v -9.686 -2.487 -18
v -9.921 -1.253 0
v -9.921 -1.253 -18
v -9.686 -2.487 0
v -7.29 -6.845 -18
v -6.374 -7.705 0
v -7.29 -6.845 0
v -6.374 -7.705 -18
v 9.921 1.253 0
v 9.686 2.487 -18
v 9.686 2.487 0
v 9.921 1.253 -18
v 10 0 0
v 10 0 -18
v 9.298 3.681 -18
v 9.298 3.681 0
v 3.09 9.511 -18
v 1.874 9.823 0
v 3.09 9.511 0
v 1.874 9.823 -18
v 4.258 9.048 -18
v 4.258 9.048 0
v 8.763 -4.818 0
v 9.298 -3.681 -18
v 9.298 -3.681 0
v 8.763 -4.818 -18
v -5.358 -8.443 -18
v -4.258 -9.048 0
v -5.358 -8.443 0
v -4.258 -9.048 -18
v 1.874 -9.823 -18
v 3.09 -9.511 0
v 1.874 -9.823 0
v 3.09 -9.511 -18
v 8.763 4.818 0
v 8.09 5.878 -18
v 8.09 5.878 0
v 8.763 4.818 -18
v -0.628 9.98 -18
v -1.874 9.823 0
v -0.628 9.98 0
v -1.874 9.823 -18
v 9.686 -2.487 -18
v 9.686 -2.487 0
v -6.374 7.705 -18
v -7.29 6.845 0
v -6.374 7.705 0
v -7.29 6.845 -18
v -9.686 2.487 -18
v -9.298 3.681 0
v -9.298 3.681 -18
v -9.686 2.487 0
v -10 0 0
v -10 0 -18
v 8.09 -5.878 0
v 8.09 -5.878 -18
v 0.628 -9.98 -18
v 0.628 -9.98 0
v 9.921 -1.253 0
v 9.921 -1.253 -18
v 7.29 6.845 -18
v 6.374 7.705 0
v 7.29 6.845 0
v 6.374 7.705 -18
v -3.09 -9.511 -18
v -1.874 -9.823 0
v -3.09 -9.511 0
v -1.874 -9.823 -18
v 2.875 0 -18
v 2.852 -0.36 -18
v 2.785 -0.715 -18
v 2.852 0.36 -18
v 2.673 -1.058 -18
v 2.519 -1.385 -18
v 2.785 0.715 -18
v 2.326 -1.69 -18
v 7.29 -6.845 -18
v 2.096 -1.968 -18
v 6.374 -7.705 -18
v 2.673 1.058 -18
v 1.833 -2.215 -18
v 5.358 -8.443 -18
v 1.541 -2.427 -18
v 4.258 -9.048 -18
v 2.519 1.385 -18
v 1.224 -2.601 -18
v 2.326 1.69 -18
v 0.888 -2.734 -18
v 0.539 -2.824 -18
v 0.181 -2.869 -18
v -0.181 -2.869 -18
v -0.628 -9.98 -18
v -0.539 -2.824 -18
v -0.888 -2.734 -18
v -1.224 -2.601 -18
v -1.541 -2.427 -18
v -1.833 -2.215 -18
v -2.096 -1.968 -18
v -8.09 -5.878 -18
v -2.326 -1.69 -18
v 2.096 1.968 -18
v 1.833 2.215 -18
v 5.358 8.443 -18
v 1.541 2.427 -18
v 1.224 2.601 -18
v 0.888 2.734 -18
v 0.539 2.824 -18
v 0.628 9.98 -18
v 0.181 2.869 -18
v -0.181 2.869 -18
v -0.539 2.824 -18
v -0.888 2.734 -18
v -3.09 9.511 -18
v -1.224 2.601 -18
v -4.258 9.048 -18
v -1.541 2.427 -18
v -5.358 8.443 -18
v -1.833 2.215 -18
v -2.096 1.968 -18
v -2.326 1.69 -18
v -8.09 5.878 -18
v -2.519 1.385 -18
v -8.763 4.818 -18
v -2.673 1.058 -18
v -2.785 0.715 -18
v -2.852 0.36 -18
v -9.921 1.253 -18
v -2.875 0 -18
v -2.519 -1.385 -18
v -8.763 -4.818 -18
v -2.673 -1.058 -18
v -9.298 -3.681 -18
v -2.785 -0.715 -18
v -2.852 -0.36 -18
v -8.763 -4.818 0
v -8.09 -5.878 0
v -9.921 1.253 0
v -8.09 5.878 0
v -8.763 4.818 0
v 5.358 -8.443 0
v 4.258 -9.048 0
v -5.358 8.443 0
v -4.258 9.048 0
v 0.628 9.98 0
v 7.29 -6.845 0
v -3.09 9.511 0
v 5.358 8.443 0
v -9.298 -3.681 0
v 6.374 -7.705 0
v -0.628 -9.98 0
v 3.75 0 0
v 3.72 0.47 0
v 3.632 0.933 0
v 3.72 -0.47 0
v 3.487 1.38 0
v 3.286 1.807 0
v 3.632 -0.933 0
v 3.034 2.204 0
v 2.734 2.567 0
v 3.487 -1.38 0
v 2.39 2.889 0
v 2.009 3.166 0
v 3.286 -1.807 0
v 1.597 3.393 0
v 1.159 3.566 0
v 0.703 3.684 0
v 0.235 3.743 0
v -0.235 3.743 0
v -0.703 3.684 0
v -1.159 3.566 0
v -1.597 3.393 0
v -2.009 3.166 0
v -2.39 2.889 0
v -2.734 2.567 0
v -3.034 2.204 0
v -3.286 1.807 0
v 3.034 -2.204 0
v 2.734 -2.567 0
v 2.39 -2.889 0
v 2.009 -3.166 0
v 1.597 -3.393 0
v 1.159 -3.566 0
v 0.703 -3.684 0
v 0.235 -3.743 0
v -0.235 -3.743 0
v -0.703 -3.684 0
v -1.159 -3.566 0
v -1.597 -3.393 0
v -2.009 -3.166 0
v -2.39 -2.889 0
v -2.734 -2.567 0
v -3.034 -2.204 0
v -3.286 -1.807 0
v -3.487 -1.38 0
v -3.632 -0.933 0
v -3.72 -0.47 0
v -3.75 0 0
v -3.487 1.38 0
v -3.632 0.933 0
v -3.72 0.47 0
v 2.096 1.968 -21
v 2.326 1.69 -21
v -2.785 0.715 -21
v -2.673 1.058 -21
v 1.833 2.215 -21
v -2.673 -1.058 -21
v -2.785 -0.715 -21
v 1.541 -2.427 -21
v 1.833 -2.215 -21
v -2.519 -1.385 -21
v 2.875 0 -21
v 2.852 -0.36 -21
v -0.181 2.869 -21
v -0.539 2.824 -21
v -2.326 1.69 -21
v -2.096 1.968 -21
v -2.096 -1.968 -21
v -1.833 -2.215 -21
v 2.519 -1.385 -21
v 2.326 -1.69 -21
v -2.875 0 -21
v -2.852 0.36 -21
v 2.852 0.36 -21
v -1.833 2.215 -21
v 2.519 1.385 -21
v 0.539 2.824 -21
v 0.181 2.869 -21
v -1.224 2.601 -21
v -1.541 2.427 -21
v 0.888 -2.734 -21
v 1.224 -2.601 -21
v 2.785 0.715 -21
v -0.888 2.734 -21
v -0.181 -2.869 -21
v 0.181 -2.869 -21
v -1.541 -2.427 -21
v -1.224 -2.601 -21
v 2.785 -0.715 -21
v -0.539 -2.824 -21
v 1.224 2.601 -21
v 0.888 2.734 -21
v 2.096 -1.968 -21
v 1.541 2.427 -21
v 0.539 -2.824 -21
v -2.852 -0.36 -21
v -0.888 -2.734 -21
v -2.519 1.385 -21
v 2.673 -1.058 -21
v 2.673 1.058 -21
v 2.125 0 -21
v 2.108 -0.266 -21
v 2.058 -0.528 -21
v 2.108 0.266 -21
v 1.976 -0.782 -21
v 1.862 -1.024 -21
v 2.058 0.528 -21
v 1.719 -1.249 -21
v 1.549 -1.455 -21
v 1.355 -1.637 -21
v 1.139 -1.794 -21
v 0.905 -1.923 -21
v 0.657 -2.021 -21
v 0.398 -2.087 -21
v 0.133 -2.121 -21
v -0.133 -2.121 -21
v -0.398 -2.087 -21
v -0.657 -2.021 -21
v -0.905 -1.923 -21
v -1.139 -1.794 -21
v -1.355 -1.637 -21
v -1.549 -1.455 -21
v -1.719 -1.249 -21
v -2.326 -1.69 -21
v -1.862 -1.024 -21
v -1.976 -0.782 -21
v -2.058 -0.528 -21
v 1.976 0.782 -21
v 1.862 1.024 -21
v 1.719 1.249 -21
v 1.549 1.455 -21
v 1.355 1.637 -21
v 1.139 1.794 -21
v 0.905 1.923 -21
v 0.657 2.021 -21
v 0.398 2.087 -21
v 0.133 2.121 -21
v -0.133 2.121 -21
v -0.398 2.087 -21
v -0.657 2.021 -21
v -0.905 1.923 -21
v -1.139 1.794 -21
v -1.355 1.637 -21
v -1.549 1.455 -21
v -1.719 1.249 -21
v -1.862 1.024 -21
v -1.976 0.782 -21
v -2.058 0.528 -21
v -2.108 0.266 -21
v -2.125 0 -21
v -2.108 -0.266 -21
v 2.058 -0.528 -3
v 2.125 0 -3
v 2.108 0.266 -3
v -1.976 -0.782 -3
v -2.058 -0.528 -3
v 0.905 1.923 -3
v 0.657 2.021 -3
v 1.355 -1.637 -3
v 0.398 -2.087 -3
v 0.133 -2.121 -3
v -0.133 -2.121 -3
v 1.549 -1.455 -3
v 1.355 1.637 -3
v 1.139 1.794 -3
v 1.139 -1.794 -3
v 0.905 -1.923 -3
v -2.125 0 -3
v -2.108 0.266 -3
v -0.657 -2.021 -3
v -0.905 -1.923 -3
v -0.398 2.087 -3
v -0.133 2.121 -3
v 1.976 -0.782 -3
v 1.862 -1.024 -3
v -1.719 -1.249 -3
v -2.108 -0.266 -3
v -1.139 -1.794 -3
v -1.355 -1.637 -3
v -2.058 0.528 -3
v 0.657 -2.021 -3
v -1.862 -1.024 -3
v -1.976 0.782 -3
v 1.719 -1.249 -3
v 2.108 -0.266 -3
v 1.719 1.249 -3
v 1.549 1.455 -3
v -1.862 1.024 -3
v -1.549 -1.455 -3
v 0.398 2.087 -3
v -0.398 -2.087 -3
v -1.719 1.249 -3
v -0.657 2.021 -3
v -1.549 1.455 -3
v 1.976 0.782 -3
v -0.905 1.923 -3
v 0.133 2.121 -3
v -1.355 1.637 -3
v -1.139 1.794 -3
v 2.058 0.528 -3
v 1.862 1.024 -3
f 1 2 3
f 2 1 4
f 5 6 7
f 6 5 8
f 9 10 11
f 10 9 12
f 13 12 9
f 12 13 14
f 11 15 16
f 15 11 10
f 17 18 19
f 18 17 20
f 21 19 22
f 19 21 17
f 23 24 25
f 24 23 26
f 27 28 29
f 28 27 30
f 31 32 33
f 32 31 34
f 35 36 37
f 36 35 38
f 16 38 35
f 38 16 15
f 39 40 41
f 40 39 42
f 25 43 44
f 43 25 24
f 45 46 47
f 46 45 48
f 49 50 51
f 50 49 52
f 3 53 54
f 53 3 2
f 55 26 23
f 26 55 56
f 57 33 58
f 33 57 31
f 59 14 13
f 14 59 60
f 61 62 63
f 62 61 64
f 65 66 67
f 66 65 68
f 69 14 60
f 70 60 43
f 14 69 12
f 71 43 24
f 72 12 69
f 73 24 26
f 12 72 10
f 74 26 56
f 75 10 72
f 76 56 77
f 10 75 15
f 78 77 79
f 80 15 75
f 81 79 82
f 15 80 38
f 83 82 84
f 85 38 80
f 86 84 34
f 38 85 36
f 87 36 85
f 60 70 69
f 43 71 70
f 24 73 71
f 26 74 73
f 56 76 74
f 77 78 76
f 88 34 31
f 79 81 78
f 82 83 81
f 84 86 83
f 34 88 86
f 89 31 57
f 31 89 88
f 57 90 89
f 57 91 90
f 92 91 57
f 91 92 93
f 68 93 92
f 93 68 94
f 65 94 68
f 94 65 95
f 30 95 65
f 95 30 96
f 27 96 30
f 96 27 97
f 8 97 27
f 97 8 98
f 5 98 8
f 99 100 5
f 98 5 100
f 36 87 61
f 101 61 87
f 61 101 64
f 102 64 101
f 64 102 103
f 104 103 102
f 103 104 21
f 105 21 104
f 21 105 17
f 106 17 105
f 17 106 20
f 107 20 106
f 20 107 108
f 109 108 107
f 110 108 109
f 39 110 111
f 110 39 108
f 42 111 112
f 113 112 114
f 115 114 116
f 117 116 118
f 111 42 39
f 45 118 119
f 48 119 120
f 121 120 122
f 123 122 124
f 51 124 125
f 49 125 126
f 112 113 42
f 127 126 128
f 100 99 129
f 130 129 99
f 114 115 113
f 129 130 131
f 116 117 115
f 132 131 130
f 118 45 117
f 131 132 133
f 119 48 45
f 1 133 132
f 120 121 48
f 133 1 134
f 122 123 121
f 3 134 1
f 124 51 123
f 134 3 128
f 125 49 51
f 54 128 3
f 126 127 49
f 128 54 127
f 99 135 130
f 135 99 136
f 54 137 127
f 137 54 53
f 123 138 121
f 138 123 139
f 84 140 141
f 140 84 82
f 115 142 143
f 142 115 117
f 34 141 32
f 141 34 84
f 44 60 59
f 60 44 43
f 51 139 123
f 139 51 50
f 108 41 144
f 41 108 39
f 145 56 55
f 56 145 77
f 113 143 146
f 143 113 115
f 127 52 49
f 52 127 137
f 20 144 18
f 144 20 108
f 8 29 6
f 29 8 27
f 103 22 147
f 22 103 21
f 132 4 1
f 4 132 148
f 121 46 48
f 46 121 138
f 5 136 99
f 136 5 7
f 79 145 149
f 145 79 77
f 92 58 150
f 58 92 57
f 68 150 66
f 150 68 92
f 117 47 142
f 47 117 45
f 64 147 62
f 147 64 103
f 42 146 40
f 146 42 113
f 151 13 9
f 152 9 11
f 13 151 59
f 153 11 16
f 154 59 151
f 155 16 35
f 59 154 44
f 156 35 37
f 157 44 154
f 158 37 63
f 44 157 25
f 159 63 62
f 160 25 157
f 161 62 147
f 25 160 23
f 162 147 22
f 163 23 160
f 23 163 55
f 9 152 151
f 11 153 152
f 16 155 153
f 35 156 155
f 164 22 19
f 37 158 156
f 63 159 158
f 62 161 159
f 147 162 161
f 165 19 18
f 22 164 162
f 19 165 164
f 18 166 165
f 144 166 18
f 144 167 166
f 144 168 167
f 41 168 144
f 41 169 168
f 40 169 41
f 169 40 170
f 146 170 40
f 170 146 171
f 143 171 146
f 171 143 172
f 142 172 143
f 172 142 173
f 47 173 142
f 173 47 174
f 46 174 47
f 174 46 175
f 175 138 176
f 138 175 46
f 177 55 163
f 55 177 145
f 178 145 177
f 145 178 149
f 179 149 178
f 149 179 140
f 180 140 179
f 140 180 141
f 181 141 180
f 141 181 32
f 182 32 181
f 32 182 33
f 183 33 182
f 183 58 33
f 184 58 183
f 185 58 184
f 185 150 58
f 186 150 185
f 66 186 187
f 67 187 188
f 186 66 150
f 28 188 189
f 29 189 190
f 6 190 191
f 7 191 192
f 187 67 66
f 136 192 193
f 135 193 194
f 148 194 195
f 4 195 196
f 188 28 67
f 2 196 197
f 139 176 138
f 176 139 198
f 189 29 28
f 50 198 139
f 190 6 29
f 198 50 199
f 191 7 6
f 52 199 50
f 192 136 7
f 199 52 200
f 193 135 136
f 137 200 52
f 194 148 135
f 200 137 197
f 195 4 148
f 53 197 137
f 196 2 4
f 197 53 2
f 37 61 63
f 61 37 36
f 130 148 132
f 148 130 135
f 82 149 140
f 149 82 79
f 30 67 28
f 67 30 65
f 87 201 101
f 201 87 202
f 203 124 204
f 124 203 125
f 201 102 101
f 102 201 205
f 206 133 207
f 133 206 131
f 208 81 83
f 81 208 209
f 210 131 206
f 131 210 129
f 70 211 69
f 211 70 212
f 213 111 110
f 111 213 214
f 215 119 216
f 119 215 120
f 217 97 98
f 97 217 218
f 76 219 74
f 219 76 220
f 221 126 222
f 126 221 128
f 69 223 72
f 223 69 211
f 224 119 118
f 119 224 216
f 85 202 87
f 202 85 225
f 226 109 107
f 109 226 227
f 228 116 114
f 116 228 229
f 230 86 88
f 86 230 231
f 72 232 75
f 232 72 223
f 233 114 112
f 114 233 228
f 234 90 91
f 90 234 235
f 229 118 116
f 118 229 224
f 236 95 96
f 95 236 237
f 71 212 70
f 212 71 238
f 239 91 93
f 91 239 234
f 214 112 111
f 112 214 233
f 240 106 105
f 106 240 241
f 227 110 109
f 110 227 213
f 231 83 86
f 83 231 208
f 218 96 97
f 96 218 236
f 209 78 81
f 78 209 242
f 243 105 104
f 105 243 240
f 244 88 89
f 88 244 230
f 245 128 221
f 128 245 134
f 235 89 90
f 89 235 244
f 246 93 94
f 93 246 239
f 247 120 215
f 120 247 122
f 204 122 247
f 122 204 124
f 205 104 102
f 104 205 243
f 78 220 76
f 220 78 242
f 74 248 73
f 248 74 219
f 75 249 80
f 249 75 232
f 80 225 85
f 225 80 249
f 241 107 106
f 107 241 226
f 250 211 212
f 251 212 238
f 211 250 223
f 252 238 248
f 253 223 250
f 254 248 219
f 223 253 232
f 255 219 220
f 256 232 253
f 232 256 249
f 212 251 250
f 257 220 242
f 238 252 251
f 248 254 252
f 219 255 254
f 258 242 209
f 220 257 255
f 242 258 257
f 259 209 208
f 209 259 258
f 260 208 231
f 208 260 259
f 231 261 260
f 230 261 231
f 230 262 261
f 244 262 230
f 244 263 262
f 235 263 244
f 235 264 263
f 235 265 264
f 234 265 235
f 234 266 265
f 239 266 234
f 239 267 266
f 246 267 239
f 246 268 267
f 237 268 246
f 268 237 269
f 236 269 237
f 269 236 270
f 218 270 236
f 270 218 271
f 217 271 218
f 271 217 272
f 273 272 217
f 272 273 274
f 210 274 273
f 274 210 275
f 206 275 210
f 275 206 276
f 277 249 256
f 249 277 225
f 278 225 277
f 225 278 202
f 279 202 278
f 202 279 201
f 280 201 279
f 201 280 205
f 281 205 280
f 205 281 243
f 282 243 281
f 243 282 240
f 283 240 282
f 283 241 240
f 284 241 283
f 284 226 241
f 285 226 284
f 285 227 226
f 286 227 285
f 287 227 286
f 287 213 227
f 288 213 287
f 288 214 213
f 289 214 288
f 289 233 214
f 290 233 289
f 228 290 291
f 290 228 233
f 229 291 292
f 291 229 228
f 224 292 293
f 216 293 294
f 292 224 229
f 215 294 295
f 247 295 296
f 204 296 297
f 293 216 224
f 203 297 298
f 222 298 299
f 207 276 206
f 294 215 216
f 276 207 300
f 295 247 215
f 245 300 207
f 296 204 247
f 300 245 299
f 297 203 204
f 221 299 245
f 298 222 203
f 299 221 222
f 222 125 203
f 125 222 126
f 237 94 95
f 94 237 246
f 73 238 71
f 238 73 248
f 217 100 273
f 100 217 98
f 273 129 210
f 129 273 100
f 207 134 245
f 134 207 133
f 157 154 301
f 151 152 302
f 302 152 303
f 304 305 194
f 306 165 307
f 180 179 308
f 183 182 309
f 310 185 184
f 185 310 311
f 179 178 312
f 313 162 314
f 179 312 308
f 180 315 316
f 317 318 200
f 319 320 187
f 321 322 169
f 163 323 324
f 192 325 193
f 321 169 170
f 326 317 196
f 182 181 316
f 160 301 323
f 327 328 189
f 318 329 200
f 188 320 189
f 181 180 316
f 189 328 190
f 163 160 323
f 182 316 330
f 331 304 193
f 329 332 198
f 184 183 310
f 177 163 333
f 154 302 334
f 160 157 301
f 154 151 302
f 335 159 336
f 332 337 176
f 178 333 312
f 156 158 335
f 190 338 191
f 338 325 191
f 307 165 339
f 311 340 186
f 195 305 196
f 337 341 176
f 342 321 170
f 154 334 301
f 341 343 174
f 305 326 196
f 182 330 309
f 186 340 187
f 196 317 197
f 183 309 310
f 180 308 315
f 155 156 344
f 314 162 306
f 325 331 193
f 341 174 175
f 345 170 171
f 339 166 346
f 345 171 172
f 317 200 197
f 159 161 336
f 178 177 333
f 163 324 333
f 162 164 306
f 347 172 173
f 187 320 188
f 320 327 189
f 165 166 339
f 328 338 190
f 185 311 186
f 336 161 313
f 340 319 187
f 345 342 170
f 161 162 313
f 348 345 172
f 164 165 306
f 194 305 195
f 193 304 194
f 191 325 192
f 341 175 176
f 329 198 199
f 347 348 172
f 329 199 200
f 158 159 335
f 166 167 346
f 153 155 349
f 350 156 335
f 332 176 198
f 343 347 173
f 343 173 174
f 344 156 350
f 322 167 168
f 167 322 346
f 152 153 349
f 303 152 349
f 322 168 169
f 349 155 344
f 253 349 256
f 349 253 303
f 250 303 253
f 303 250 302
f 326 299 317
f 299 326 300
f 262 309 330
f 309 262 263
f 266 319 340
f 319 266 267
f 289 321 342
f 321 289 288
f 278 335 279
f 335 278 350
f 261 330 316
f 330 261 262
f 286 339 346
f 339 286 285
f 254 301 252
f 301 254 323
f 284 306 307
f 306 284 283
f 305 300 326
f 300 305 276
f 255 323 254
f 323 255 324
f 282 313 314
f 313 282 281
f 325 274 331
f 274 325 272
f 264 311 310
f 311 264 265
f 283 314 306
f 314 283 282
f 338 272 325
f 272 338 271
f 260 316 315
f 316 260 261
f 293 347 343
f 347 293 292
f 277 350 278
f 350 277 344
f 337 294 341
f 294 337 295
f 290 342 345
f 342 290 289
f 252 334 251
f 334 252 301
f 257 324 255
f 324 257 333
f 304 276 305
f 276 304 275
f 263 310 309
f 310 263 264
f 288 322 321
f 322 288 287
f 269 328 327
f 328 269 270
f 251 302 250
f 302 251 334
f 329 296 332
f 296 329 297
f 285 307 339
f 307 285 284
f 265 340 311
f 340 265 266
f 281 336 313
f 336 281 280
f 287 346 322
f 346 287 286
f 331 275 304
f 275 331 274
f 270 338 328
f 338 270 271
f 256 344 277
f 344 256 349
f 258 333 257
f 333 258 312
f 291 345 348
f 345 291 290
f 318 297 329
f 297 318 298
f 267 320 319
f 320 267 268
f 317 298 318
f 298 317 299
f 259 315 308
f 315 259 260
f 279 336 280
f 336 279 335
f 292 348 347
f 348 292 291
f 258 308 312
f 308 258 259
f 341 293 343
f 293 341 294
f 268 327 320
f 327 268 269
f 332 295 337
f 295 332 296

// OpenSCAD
$fn = 50;

difference() {
	union() {
		translate(v = [0, 0, -18.0]) {
			cylinder(h = 18, r = 10.0);
		}
		#translate(v = [0, 0, -21.0]) {
			cylinder(h = 21, r = 2.875);
		}
	}
	union() {
		translate(v = [0, 0, 0]) {
			rotate(a = [0, 0, 0]) {
				difference() {
					union() {
						translate(v = [0, 0, -21.0]) {
							cylinder(h = 21, r = 2.0);
						}
						translate(v = [0, 0, -3]) {
							cylinder(h = 3, r1 = 2.125, r2 = 3.75);
						}
						translate(v = [0, 0, -21.0]) {
							cylinder(h = 21, r = 2.125);
						}
						translate(v = [0, 0, -21.0]) {
							cylinder(h = 21, r = 2.0);
						}
					}
					union();
				}
			}
		}
	}
}
